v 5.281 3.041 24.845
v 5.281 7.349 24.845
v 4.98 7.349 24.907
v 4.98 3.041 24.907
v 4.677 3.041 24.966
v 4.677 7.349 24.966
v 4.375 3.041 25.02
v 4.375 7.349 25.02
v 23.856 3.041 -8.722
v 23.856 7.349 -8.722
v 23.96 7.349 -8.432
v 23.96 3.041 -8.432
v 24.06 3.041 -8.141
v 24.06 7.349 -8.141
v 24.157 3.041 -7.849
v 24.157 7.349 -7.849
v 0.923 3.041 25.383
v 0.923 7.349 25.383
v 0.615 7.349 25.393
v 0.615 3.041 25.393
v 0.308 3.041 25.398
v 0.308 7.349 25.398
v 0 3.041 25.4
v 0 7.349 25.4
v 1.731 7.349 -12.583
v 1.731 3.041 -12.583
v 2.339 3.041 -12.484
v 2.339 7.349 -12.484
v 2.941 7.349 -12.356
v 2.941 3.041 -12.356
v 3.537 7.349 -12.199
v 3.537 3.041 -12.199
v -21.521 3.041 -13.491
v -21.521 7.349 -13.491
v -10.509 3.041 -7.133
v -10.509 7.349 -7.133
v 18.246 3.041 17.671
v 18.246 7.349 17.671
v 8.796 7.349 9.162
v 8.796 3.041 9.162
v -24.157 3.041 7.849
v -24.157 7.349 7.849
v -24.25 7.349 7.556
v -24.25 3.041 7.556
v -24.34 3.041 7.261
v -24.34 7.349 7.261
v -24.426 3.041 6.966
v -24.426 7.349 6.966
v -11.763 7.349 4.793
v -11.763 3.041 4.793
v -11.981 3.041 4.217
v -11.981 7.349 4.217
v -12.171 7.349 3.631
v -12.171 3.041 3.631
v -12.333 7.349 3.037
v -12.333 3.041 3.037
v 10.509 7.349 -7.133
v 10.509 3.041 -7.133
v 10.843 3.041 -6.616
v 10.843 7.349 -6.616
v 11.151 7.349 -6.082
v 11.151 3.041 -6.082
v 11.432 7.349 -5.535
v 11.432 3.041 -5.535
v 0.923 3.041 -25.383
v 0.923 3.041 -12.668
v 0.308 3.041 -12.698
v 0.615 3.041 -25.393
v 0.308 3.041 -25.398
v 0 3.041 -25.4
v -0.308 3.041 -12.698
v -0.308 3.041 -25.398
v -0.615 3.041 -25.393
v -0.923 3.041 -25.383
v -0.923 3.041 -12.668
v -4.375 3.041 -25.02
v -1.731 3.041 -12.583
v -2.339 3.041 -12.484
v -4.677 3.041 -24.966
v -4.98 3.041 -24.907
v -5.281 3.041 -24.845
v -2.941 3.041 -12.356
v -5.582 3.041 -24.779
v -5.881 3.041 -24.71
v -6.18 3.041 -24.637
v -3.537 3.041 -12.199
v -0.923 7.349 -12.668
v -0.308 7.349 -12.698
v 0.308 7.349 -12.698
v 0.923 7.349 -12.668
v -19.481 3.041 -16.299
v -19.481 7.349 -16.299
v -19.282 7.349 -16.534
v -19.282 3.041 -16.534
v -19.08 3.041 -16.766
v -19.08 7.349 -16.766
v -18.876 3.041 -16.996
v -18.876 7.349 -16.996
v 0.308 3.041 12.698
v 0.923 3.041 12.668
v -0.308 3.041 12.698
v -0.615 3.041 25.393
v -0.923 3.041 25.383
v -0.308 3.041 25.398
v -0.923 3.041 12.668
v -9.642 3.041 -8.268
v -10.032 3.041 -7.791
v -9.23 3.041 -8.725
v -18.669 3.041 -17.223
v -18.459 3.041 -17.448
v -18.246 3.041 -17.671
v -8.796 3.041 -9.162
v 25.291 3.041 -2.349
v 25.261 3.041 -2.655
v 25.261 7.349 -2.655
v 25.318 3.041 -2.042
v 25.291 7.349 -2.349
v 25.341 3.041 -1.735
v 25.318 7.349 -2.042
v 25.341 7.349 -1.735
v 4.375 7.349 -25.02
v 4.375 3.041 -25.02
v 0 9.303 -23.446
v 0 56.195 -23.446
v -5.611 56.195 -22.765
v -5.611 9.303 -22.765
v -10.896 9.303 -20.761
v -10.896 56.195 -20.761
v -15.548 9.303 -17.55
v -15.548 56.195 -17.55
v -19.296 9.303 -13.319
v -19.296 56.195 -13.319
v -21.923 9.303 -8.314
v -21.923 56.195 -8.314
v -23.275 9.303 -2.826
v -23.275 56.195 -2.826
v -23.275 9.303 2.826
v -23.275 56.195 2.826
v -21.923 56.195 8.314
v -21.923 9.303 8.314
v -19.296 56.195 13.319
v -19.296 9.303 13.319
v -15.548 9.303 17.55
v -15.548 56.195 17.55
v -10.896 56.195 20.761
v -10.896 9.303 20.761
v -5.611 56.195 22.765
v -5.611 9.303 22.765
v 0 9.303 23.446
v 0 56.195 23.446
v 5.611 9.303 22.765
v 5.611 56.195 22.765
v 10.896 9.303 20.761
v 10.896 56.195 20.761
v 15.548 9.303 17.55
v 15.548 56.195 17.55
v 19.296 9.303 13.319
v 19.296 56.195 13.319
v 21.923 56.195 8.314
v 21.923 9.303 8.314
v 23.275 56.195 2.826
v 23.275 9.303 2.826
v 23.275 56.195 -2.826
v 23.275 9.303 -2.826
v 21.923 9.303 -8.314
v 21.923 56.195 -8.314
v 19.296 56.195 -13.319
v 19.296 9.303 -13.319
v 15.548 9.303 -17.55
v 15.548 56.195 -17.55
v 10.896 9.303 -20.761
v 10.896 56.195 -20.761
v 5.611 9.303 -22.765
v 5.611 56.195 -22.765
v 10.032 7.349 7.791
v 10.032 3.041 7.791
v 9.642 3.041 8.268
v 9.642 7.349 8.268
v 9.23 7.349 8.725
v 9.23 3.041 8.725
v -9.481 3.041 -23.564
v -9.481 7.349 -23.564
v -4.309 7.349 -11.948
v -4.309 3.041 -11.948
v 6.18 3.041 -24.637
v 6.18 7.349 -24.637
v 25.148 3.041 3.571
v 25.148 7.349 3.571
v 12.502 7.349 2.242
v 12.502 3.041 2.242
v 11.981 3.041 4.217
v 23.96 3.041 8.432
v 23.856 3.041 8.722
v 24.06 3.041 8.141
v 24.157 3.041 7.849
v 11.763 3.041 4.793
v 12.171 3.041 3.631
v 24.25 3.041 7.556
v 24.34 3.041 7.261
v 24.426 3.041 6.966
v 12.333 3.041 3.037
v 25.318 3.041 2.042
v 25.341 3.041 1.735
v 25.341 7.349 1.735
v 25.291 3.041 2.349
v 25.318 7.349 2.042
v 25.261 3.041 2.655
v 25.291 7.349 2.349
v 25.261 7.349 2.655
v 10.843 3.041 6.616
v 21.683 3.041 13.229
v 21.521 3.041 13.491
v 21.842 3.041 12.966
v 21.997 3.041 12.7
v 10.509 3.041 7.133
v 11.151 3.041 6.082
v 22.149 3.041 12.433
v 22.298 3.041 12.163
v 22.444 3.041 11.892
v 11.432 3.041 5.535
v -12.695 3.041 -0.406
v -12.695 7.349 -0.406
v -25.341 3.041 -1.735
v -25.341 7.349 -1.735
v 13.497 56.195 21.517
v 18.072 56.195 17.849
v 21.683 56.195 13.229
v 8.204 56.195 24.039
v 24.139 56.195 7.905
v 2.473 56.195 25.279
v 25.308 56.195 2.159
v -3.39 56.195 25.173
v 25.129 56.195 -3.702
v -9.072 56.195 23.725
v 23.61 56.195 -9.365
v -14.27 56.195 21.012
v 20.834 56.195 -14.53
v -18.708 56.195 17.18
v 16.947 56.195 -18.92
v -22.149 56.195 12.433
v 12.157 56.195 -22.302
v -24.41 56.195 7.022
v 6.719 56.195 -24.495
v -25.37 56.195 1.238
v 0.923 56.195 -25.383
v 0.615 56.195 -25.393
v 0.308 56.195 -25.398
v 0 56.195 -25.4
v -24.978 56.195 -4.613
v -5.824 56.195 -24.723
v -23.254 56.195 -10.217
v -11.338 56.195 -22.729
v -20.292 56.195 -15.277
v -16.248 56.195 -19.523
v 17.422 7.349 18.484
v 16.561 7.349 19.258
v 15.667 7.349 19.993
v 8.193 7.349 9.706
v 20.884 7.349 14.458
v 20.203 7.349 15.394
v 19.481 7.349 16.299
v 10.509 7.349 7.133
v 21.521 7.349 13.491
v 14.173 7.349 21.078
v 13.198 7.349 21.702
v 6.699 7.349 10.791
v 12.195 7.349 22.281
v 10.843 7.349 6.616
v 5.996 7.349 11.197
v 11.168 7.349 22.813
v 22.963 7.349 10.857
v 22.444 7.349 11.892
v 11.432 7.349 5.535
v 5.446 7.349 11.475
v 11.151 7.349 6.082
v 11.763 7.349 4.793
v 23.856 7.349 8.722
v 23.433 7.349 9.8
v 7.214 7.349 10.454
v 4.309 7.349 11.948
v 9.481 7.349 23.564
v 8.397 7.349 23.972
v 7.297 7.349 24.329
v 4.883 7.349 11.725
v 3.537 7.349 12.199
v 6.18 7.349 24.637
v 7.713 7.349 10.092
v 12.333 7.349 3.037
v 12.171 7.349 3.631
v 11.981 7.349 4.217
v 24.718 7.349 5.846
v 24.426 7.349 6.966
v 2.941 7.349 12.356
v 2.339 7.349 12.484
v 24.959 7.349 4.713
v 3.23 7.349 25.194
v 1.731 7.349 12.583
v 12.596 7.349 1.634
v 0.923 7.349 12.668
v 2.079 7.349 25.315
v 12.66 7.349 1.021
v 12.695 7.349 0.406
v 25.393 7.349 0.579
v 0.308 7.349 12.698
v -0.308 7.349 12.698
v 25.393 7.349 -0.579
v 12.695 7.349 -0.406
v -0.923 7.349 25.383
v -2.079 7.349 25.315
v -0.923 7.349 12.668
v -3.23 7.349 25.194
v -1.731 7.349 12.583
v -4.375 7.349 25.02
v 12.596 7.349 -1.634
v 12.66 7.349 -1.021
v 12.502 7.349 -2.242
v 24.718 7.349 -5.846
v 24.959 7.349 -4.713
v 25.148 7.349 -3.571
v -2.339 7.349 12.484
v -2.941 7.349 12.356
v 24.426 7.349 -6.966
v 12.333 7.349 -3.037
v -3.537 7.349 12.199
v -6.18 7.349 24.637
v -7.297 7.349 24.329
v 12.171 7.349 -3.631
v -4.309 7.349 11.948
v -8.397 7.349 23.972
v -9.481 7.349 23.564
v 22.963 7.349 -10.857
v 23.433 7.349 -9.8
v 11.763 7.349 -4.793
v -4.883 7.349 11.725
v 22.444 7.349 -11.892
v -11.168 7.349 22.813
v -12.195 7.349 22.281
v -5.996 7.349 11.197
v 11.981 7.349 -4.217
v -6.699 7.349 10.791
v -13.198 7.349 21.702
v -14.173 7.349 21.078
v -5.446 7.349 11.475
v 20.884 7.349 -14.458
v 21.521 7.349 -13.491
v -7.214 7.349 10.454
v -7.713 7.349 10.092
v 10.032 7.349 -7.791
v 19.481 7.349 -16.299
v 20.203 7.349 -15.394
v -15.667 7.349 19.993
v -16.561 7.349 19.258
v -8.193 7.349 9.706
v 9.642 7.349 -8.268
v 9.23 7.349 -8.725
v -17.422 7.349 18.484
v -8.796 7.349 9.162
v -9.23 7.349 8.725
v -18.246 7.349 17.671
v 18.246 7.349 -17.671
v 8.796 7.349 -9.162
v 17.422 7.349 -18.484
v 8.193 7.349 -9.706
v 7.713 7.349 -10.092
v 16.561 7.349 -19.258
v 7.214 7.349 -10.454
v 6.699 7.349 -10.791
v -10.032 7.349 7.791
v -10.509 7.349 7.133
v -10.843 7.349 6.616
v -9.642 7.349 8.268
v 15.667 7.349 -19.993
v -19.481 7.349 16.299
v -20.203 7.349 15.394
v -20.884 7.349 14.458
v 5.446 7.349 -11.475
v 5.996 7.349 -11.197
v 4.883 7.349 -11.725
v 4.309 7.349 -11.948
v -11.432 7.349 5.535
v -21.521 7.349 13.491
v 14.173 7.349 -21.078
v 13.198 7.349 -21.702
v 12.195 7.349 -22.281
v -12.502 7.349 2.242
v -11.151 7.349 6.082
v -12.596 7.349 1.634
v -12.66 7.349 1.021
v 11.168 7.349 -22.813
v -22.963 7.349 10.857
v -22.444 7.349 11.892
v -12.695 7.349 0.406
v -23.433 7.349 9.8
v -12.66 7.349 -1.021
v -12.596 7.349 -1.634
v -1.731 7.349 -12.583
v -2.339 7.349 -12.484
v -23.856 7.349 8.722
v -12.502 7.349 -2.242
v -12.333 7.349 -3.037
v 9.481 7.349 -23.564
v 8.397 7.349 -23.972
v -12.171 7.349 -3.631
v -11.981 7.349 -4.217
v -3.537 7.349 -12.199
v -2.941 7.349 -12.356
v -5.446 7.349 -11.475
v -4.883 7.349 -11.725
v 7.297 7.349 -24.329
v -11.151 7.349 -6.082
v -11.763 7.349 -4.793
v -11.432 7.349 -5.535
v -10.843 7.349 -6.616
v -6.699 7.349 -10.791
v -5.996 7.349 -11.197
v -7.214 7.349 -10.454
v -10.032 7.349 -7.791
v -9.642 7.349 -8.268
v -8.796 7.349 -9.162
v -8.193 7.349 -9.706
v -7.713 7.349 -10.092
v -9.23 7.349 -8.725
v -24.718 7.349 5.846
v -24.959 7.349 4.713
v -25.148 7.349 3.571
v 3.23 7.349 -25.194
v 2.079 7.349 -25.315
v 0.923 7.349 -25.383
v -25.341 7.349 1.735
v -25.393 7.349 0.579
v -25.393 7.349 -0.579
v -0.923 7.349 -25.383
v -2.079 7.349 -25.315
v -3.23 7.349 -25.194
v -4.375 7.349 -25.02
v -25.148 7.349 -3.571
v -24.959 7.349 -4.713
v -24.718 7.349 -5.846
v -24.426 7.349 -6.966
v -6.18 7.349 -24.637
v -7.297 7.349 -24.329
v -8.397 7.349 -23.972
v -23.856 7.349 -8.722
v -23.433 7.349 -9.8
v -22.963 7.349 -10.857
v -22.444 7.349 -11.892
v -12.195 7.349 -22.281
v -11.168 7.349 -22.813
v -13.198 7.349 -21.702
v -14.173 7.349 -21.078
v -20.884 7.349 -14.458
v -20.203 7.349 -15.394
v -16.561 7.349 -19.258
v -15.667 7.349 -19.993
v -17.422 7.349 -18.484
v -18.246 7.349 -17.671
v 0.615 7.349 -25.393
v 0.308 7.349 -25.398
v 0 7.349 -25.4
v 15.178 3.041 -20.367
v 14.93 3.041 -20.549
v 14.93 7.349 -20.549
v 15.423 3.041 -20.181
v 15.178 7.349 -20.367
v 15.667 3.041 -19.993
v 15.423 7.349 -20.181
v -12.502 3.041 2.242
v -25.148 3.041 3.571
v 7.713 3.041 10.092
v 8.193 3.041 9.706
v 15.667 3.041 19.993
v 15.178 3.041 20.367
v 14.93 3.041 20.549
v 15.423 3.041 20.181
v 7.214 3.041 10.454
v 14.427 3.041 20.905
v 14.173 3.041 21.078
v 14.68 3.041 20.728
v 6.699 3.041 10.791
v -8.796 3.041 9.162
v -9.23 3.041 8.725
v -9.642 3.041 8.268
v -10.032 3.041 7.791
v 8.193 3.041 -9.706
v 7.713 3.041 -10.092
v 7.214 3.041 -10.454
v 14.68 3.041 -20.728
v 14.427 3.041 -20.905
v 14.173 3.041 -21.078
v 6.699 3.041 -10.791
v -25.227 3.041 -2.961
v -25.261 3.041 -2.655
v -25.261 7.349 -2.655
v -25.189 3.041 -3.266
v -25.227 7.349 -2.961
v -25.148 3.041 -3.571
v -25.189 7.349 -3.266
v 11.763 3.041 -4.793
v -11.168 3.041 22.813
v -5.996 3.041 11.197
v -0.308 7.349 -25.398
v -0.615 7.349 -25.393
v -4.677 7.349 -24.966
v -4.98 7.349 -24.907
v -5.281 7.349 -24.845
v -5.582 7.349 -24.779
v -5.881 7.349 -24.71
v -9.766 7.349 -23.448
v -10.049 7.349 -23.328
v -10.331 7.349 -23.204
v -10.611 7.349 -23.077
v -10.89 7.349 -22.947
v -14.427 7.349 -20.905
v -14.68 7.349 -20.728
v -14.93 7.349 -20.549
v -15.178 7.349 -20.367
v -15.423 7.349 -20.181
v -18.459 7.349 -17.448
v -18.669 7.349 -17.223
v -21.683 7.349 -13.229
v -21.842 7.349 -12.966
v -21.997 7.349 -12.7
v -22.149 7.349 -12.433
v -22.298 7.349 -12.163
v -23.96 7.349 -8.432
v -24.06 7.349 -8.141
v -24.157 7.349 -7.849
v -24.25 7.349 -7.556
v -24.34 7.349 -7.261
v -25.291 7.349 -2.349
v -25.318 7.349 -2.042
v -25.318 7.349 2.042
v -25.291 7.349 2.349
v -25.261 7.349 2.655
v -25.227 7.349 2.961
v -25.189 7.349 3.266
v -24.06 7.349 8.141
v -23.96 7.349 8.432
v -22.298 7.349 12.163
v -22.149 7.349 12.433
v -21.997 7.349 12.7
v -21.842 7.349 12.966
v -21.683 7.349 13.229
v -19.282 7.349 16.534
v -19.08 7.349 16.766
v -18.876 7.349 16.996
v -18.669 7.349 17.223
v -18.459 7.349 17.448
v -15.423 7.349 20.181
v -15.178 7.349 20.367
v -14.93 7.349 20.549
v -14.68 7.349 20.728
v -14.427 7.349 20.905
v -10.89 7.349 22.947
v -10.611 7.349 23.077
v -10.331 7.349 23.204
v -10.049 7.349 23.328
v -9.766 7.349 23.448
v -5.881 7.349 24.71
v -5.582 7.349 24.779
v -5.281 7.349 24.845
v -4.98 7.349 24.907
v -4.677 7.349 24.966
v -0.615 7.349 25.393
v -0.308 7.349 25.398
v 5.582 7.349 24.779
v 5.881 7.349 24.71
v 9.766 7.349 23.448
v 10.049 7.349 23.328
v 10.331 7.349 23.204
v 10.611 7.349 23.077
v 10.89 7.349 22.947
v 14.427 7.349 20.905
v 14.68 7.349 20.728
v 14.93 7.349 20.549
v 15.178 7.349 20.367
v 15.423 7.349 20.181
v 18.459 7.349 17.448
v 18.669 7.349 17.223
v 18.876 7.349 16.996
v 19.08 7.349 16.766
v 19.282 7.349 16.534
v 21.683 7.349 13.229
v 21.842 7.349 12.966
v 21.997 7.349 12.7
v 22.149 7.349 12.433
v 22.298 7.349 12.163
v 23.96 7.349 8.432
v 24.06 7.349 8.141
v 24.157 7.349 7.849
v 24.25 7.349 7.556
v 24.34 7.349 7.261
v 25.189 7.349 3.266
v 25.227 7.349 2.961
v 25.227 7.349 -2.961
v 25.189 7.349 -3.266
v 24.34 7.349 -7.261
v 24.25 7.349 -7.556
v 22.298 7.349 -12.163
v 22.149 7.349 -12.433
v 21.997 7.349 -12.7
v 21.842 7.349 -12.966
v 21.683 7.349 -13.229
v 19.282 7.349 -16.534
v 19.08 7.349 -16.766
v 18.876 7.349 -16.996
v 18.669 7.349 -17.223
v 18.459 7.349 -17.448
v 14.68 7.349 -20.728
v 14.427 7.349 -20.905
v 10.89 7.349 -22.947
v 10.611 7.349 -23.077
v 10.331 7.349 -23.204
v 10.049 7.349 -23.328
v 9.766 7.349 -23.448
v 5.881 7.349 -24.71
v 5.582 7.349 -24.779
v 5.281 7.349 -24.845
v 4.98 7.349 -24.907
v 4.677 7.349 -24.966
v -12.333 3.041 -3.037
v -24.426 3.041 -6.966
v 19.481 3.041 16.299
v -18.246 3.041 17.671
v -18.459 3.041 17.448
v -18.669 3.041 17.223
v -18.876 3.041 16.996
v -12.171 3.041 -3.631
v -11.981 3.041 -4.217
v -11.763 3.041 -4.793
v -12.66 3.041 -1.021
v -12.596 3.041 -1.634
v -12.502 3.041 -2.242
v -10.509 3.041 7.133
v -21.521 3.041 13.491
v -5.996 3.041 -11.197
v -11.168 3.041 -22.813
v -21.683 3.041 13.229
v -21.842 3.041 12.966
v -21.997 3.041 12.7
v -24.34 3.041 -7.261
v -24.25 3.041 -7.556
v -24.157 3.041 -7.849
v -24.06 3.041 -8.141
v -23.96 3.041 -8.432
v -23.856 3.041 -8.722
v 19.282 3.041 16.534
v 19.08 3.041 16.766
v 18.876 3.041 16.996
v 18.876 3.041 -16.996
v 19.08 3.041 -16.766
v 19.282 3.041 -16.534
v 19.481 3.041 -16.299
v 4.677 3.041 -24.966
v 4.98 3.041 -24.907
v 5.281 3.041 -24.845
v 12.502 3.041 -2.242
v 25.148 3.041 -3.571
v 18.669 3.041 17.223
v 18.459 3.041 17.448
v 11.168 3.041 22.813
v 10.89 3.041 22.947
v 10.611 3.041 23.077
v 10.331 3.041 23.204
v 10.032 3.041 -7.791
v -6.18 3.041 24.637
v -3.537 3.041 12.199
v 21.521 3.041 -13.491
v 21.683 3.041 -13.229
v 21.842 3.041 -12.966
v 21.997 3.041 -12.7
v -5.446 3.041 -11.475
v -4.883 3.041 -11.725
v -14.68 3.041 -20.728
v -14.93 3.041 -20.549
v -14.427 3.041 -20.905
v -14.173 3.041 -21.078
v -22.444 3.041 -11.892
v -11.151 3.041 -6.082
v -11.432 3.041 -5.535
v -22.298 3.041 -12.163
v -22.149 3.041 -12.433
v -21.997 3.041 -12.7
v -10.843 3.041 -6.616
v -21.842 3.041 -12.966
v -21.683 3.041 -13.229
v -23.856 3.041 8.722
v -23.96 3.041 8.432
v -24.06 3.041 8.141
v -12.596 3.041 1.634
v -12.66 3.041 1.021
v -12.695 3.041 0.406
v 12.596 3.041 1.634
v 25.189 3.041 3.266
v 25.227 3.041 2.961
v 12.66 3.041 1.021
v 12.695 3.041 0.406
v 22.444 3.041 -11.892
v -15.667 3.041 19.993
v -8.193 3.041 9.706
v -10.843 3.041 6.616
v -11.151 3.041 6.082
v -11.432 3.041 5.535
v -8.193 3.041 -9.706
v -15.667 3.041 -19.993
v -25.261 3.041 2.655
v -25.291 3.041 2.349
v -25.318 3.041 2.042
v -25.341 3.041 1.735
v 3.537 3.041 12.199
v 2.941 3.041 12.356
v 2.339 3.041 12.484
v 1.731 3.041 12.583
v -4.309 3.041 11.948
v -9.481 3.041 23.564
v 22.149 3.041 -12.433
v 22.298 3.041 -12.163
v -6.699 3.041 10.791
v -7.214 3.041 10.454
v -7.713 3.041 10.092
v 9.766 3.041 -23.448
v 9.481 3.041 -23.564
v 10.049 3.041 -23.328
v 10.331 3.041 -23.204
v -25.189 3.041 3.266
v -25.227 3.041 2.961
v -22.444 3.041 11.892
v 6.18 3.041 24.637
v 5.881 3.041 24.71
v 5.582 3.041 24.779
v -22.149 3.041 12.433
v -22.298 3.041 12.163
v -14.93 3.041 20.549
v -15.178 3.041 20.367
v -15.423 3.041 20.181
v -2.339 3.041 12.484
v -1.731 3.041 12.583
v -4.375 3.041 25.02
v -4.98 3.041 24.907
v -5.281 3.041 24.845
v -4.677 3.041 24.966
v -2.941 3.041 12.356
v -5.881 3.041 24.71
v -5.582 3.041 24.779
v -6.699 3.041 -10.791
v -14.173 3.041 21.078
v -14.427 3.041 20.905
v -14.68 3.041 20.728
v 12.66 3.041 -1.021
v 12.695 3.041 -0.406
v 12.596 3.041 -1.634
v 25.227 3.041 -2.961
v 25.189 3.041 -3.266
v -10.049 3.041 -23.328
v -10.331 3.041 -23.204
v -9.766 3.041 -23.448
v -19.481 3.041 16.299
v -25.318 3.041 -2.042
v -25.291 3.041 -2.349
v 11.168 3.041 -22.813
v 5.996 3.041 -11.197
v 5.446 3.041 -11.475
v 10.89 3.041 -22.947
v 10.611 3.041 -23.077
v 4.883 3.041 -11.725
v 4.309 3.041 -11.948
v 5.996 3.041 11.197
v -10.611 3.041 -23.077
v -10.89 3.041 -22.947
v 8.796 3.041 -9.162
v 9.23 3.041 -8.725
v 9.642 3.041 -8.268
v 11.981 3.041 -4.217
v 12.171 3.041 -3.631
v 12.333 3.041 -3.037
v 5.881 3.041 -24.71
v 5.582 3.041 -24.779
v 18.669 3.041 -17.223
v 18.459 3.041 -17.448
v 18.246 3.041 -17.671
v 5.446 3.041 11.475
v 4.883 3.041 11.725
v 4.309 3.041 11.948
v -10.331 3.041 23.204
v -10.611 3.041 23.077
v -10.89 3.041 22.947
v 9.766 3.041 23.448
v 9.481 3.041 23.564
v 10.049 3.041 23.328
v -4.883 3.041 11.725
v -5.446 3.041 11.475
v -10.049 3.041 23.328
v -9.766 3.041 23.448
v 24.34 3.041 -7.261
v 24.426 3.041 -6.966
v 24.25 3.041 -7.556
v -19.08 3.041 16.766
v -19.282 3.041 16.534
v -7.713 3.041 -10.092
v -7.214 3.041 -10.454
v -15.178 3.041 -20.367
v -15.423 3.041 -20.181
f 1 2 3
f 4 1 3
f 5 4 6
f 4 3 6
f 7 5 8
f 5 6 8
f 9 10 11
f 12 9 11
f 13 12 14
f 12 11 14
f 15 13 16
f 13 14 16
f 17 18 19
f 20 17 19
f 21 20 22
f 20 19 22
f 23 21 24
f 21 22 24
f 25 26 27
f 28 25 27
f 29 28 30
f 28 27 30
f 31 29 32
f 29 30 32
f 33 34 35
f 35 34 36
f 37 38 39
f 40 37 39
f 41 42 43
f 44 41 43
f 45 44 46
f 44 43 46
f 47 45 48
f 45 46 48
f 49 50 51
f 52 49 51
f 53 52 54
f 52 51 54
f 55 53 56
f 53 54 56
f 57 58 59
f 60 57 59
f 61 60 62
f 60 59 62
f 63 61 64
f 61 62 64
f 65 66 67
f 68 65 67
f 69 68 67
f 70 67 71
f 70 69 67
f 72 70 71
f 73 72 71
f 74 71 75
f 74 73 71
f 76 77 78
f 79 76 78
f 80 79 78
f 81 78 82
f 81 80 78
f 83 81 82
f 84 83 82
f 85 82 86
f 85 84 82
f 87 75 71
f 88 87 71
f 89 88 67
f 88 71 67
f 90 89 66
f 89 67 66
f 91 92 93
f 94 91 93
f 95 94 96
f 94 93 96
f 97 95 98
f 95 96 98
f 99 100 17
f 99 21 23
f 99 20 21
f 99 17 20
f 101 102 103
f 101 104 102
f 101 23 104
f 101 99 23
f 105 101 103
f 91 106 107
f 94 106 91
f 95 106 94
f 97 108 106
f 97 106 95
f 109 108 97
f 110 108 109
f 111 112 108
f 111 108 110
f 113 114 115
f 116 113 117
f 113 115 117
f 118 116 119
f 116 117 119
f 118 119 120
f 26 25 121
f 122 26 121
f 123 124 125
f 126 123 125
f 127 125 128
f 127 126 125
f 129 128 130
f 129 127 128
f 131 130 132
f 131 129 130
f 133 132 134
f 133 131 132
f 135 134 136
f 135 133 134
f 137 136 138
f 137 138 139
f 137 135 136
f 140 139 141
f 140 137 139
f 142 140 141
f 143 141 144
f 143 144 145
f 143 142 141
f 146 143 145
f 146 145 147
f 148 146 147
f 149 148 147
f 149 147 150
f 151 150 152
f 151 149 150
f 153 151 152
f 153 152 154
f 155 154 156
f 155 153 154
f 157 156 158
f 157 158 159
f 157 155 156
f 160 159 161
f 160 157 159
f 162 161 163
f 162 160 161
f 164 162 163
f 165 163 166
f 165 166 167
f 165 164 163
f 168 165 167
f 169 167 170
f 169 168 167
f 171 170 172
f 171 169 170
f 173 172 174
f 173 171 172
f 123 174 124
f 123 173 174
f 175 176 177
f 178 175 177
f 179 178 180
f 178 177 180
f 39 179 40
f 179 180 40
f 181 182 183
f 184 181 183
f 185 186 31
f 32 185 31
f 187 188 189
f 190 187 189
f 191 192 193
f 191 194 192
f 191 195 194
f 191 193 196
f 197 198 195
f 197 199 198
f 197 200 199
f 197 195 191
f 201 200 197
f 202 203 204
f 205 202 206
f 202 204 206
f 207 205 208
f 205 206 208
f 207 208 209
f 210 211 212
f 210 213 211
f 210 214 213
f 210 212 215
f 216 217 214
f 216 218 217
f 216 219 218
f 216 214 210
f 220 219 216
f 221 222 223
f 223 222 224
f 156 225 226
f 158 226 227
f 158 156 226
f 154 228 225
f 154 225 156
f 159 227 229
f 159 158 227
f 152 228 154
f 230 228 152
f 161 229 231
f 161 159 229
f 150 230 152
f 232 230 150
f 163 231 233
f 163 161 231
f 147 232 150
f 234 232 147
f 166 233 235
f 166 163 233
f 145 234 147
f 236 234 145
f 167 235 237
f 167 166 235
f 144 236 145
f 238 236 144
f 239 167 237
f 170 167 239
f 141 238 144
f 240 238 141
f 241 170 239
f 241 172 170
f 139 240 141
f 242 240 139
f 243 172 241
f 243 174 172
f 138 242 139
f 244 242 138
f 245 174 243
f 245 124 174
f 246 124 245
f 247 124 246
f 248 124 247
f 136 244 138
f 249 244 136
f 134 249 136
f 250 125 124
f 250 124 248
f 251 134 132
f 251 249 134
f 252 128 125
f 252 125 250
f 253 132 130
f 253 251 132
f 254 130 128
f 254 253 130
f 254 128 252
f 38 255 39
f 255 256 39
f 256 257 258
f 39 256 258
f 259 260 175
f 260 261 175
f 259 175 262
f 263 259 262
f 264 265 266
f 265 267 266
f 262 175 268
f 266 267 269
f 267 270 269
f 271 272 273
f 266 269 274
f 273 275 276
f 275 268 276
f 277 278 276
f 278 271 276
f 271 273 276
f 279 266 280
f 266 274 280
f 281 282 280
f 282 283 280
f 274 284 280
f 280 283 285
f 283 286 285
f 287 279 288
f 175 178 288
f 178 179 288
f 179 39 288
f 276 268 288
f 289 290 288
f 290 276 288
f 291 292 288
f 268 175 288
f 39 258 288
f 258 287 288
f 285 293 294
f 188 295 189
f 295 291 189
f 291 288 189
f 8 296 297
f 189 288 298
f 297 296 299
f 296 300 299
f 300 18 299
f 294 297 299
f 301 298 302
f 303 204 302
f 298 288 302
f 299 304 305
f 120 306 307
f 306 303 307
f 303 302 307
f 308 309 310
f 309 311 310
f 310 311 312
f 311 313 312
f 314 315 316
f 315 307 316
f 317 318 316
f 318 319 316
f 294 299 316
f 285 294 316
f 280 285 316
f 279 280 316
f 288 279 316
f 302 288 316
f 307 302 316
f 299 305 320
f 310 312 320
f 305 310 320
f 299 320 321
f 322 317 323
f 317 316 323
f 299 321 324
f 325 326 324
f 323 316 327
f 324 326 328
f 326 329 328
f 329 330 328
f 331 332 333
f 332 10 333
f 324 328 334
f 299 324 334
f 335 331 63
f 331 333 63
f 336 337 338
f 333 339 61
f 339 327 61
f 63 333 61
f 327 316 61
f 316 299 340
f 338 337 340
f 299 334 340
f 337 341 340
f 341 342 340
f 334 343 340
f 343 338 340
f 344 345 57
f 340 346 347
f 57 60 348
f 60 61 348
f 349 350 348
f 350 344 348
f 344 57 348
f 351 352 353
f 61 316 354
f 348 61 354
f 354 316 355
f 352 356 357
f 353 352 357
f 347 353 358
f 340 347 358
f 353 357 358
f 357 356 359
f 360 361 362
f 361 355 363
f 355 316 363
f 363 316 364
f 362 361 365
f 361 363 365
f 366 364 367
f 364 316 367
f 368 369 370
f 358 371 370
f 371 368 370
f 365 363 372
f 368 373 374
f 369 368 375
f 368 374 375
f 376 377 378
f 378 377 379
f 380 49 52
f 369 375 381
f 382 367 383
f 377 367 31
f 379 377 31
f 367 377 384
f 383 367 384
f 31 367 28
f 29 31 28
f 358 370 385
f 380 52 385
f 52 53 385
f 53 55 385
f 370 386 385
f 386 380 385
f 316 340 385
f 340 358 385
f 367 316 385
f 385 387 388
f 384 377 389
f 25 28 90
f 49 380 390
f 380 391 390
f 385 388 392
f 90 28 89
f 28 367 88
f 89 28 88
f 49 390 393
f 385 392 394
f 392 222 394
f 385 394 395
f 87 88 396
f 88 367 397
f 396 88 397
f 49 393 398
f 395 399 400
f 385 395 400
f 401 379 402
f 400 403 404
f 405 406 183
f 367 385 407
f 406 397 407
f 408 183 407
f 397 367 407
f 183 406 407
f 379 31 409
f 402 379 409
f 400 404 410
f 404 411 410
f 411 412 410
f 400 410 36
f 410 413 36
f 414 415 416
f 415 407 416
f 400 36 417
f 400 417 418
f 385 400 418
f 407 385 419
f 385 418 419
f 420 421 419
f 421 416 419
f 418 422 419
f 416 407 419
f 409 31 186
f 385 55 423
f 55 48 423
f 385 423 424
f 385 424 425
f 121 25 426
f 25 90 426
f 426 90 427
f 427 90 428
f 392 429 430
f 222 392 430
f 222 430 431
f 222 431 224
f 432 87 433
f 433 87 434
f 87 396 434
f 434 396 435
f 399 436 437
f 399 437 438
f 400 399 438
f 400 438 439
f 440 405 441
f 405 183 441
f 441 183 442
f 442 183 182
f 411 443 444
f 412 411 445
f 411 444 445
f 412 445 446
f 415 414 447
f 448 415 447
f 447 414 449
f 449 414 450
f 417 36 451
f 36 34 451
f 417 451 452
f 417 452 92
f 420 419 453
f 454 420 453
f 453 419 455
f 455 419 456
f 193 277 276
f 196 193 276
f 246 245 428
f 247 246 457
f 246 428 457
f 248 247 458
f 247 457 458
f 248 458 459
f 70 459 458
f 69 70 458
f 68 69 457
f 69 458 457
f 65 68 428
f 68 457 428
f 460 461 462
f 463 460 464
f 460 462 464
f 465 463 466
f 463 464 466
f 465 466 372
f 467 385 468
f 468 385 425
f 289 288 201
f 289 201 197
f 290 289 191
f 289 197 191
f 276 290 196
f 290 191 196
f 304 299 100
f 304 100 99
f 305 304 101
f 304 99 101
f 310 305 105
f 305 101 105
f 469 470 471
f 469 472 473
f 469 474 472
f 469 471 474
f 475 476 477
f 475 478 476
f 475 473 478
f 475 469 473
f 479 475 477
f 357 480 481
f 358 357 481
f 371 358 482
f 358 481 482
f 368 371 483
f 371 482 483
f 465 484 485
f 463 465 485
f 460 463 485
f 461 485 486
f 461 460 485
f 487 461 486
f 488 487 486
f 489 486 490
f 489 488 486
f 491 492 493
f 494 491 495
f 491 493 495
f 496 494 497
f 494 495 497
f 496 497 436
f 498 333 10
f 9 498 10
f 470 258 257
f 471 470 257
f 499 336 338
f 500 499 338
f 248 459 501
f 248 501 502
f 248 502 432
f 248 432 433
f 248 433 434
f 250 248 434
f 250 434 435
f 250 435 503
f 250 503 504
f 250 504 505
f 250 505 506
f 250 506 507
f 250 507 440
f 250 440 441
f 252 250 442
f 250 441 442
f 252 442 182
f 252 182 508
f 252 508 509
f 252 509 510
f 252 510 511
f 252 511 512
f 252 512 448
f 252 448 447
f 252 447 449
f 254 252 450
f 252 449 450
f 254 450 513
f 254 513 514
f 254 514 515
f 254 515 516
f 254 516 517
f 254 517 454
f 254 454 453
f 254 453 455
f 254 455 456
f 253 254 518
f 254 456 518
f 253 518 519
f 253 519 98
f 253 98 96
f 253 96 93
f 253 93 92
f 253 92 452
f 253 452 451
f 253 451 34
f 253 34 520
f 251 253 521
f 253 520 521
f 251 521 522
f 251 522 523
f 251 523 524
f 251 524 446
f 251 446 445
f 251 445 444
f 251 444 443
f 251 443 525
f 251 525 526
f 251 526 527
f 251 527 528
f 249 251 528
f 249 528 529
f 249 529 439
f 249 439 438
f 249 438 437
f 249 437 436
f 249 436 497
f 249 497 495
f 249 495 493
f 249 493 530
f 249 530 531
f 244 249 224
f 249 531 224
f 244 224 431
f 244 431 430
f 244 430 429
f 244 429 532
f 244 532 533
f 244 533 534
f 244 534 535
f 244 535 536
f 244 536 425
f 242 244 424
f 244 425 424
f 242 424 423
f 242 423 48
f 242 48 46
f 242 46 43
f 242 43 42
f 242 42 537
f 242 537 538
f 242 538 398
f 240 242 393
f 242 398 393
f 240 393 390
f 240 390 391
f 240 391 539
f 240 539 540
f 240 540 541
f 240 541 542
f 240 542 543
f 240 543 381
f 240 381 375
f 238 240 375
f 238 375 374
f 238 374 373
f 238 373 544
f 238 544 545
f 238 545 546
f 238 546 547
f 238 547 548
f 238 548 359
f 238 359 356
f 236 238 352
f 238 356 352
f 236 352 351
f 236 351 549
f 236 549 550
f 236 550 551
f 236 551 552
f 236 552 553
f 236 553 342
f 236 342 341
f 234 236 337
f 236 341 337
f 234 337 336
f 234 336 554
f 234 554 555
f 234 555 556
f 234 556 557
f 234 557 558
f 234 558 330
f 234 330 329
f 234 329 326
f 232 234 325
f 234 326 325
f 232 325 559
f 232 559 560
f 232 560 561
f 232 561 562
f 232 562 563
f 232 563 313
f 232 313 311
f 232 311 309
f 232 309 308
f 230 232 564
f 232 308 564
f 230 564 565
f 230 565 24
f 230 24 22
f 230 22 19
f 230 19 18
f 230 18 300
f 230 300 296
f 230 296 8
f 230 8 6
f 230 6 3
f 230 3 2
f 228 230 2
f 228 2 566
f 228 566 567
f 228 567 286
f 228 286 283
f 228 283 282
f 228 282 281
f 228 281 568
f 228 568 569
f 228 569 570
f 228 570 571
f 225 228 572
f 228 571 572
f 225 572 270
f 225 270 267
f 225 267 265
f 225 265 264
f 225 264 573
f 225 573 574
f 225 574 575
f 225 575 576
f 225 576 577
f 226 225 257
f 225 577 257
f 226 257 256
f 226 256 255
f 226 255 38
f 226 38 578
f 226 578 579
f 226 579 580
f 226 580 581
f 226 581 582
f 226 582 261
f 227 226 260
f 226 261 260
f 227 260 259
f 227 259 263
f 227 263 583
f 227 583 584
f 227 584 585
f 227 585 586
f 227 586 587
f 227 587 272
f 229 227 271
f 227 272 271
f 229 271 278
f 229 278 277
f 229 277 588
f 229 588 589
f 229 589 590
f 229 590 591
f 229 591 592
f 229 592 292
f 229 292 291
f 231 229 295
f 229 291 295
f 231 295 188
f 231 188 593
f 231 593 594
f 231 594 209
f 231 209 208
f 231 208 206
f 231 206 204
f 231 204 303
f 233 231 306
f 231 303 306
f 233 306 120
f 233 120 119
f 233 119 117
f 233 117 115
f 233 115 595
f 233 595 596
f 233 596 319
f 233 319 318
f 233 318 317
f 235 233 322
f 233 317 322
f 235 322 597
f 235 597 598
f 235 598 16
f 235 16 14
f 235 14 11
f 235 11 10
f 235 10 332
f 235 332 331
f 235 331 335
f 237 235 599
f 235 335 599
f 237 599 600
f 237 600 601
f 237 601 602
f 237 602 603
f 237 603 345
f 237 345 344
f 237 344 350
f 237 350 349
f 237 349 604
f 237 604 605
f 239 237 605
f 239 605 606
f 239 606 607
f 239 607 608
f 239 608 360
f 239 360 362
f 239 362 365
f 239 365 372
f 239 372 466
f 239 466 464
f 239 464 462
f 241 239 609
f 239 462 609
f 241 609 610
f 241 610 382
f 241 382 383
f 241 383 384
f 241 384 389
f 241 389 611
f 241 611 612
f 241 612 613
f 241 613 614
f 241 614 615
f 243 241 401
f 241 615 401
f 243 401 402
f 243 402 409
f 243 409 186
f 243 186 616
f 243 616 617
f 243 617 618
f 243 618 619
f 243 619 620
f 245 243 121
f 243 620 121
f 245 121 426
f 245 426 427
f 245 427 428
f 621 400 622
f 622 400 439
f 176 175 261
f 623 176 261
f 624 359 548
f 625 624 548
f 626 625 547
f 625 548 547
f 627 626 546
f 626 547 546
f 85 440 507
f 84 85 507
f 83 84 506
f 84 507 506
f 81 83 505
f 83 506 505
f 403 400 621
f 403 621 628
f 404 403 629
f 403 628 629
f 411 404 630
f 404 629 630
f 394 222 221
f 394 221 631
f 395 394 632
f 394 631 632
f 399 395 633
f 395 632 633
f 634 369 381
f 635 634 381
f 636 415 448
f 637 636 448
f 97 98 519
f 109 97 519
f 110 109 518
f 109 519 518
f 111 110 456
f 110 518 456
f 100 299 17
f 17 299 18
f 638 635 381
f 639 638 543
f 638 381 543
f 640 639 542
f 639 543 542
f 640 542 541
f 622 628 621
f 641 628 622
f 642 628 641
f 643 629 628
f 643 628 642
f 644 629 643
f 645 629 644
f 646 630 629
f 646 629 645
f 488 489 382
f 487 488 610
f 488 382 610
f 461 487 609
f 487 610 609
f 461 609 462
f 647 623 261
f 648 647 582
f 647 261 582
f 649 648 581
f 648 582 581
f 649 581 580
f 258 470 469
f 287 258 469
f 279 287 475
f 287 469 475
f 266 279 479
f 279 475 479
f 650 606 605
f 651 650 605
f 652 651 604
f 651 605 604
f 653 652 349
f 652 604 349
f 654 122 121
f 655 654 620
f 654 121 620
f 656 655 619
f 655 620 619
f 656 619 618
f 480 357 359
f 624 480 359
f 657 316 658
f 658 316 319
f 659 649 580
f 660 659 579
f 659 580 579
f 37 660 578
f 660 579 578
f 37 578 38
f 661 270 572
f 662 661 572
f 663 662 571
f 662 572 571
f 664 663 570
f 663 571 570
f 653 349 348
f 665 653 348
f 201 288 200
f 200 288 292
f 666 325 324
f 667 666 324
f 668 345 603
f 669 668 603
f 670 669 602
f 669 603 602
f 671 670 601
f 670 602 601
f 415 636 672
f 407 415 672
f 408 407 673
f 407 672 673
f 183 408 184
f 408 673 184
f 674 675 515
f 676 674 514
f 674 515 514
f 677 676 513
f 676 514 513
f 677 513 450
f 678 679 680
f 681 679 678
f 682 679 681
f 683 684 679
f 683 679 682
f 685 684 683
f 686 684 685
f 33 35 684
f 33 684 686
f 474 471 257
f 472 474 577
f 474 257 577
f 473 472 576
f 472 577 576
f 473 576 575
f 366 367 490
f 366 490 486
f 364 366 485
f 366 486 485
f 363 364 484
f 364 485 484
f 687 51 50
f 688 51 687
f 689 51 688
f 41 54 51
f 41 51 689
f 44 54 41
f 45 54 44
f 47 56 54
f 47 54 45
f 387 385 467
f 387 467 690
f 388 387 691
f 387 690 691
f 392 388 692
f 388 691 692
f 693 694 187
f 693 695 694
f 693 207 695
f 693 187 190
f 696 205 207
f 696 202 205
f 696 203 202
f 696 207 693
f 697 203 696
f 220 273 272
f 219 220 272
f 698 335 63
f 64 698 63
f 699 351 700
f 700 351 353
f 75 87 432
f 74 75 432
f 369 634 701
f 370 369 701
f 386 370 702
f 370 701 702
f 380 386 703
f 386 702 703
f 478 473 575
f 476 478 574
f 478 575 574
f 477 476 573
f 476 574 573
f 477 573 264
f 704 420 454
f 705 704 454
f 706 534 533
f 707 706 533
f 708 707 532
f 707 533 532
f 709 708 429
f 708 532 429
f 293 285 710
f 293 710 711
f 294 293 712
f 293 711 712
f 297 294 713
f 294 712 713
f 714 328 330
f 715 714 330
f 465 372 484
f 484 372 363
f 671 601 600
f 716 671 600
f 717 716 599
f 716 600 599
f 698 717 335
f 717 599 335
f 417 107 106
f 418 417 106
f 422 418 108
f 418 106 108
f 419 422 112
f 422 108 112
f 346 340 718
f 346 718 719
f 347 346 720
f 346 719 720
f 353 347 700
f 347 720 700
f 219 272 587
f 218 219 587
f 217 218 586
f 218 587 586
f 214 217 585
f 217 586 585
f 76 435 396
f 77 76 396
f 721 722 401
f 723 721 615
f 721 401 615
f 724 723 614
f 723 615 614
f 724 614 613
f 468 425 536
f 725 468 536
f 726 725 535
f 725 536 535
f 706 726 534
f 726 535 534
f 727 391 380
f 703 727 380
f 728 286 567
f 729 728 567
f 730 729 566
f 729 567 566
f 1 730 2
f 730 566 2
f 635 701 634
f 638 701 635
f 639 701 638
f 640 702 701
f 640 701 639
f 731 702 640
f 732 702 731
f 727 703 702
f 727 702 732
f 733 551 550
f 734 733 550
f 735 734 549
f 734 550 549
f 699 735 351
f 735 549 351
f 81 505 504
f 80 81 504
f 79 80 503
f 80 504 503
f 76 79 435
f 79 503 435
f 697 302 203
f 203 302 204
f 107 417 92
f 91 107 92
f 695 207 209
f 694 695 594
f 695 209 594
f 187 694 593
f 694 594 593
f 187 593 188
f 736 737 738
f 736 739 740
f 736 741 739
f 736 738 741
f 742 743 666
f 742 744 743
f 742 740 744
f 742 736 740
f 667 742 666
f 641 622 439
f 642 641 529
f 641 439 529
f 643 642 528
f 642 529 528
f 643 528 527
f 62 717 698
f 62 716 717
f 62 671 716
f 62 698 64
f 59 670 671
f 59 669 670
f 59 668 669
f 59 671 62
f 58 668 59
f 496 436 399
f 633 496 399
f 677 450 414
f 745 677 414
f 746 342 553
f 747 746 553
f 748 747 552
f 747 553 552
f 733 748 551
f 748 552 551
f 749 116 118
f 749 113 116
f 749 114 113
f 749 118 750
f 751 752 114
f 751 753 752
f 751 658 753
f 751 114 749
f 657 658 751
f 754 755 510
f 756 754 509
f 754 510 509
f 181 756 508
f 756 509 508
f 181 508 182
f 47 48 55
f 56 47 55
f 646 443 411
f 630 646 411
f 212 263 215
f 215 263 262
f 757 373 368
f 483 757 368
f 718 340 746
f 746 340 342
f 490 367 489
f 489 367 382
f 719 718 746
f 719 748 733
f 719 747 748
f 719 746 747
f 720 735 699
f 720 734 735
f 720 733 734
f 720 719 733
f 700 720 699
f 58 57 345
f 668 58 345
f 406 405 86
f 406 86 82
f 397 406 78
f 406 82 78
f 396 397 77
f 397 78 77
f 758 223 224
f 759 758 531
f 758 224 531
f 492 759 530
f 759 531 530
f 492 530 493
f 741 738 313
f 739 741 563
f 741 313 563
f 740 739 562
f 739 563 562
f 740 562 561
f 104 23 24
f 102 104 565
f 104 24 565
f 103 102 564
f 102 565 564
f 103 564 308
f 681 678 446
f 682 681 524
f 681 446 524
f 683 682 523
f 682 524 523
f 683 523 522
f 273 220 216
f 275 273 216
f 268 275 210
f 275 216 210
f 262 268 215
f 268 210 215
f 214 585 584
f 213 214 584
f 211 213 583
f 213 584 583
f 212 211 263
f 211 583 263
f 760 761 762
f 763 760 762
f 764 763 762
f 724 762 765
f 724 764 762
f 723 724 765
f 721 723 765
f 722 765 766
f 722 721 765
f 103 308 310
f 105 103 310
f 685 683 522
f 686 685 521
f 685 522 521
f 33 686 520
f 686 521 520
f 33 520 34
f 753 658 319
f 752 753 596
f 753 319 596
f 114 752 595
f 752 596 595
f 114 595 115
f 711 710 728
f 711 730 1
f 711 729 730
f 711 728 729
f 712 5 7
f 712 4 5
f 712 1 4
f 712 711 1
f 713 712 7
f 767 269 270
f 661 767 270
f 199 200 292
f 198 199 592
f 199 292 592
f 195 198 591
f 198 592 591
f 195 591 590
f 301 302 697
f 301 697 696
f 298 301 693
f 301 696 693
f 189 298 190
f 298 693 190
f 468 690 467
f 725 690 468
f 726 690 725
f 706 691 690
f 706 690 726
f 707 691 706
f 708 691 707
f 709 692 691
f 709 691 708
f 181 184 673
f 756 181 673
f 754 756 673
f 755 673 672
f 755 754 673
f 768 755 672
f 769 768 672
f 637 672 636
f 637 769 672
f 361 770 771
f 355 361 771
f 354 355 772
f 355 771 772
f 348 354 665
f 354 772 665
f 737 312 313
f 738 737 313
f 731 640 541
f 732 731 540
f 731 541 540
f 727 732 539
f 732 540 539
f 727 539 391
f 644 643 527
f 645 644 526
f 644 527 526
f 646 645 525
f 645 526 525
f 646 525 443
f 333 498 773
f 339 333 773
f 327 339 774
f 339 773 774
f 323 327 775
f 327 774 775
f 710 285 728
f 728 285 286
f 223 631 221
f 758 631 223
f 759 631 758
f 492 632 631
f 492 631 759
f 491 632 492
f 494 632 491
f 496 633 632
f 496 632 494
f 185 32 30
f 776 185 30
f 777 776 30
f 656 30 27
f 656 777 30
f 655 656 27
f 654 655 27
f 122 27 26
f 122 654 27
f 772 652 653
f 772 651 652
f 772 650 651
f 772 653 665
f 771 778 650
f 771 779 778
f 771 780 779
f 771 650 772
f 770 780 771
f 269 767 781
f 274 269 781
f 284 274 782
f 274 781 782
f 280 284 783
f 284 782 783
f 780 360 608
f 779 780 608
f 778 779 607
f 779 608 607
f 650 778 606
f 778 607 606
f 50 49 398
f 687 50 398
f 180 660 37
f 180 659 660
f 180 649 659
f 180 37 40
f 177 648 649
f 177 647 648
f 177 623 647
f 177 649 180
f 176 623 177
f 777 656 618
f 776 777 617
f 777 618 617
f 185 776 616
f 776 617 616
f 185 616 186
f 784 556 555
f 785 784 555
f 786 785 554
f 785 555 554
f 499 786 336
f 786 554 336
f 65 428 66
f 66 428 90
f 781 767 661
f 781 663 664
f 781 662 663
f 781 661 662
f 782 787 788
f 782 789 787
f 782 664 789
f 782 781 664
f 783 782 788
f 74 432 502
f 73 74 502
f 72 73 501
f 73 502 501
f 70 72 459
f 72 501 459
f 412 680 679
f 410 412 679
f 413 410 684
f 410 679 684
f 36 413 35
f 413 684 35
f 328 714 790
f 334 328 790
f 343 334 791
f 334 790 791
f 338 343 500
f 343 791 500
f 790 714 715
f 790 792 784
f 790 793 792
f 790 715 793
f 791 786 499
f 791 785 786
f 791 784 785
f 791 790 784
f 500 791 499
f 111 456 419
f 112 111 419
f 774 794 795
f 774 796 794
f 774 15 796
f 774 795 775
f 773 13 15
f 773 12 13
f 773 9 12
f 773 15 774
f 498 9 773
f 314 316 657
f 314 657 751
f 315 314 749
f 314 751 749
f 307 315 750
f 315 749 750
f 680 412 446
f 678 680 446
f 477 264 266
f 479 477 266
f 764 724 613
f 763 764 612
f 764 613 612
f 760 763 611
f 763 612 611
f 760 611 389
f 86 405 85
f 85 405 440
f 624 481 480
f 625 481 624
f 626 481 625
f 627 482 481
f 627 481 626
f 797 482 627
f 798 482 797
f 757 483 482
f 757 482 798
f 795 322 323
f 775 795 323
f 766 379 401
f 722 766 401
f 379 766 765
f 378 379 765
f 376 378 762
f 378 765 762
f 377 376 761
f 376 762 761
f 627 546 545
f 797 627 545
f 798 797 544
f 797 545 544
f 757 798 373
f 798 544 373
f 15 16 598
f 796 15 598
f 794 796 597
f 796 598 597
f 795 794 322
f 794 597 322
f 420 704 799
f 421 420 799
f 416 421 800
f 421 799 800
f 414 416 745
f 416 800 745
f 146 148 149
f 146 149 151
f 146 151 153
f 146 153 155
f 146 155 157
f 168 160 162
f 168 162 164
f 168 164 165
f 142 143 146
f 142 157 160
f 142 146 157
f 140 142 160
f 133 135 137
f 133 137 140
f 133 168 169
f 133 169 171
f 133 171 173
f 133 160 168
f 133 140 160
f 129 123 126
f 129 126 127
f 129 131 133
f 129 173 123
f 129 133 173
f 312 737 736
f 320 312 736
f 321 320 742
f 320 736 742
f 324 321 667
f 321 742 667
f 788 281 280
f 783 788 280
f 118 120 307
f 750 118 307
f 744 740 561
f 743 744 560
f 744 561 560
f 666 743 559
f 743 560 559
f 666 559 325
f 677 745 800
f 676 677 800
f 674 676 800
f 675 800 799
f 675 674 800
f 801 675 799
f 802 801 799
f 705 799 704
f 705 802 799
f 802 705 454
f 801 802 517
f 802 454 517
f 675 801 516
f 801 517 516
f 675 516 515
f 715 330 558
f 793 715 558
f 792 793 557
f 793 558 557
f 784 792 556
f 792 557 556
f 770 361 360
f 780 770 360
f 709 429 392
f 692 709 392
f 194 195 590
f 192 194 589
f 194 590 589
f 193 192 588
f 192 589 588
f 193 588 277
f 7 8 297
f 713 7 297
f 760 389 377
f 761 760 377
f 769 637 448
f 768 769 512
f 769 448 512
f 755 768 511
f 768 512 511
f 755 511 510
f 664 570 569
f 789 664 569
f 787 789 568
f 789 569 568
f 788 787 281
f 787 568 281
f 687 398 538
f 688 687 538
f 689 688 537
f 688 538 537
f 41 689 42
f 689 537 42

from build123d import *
from build123d.topology import SkipClean

# Parameters (mm, degrees)
SKETCH1_R               = 38.1
BOSS_EXTRUDE1_DEPTH     = 76.2
SHELL2_T                = 3.175
BOSS_EXTRUDE2_DEPTH     = 7
CUT_EXTRUDE1_DEPTH      = 99.527366122
CUT_EXTRUDE1_DEPTH_BACK = 99.527366122
SKETCH3_R               = 61.906276858
SKETCH3_R_2             = 41.275
SKETCH4_R               = 20.64
CUT_EXTRUDE2_DEPTH      = 7
SCALE1_SCALE            = 0.615384615


# Read off the part's stored shape, not the designer's step: Boss-Extrude2
with BuildPart() as part:
    # Sketch1 → Boss-Extrude1 (new body)
    with BuildSketch(Plane(origin=(0, 0, 0), x_dir=(1, 0, 0), z_dir=(0, 1, 0))):
        with Locations(Location((0, 0, 0), (0, 0, 90))):
            Circle(SKETCH1_R)
    extrude(amount=BOSS_EXTRUDE1_DEPTH)

    # Shell2
    shell2_openings = [part.faces().sort_by_distance(p)[0] for p in [
        (0, 76.2, 0),
    ]]
    offset(amount=SHELL2_T, openings=shell2_openings, kind=Kind.INTERSECTION)

    # Boss-Extrude2 outline → Boss-Extrude2 (add)
    with BuildSketch(Plane(origin=(0, -3.175, 0), x_dir=(-1, 0, 0), z_dir=(0, -1, 0))):
        Polygon((1.5, 14.271546681), (1.5, 41.275), (-1.5, 41.275), (-1.5, 14.271546681), (-7.114333637, 40.684909757), (-10.04877644, 40.061174684), (-4.434442802, 13.647811609), (-15.417736756, 38.316693729), (-18.158373129, 37.0964838), (-7.175079175, 12.42760168), (-23.047310797, 34.273854321), (-25.47436178, 32.510498564), (-9.602130158, 10.664245923), (-29.669606762, 28.733083016), (-31.676998581, 26.503648539), (-11.609521977, 8.434811446), (-34.995198541, 21.936538106), (-36.495198541, 19.338461894), (-13.109521977, 5.836735235), (-38.791332219, 14.181261217), (-39.718383202, 11.328091668), (-14.03657296, 2.983565686), (-40.892098536, 5.806195164), (-41.205683926, 2.822629478), (-14.35015835, 0), (-41.205683926, -2.822629478), (-40.892098536, -5.806195164), (-14.03657296, -2.983565686), (-39.718383202, -11.328091668), (-38.791332219, -14.181261217), (-13.109521977, -5.836735235), (-36.495198541, -19.338461894), (-34.995198541, -21.936538106), (-11.609521977, -8.434811446), (-31.676998581, -26.503648539), (-29.669606762, -28.733083016), (-9.602130158, -10.664245923), (-25.47436178, -32.510498564), (-23.047310797, -34.273854321), (-7.175079175, -12.42760168), (-18.158373129, -37.0964838), (-15.417736756, -38.316693729), (-4.434442802, -13.647811609), (-10.04877644, -40.061174684), (-7.114333637, -40.684909757), (-1.5, -14.271546681), (-1.5, -41.275), (1.5, -41.275), (1.5, -14.271546681), (7.114333637, -40.684909757), (10.04877644, -40.061174684), (4.434442802, -13.647811609), (15.417736756, -38.316693729), (18.158373129, -37.0964838), (7.175079175, -12.42760168), (23.047310797, -34.273854321), (25.47436178, -32.510498564), (9.602130158, -10.664245923), (29.669606762, -28.733083016), (31.676998581, -26.503648539), (11.609521977, -8.434811446), (34.995198541, -21.936538106), (36.495198541, -19.338461894), (13.109521977, -5.836735235), (38.791332219, -14.181261217), (39.718383202, -11.328091668), (14.03657296, -2.983565686), (40.892098536, -5.806195164), (41.205683926, -2.822629478), (14.35015835, 0), (41.205683926, 2.822629478), (40.892098536, 5.806195164), (14.03657296, 2.983565686), (39.718383202, 11.328091668), (38.791332219, 14.181261217), (13.109521977, 5.836735235), (36.495198541, 19.338461894), (34.995198541, 21.936538106), (11.609521977, 8.434811446), (31.676998581, 26.503648539), (29.669606762, 28.733083016), (9.602130158, 10.664245923), (25.47436178, 32.510498564), (23.047310797, 34.273854321), (7.175079175, 12.42760168), (18.158373129, 37.0964838), (15.417736756, 38.316693729), (4.434442802, 13.647811609), (10.04877644, 40.061174684), (7.114333637, 40.684909757), align=None)
    extrude(amount=BOSS_EXTRUDE2_DEPTH)

    # Sketch3 → Cut-Extrude1 (cut, two sides: drawn at the far end of the back side and taken through both)
    with SkipClean():  # the faces are left unmerged after this step: merging them gives an invalid solid
        with BuildSketch(Plane.XZ.offset(3.175).offset(-CUT_EXTRUDE1_DEPTH_BACK)):
            Circle(SKETCH3_R)
            with Locations(Location((0, 0, 0), (0, 0, 272.082679548))):
                Circle(SKETCH3_R_2, mode=Mode.SUBTRACT)
        extrude(amount=CUT_EXTRUDE1_DEPTH + CUT_EXTRUDE1_DEPTH_BACK, mode=Mode.SUBTRACT)

    # Sketch4 → Cut-Extrude2 (cut)
    with SkipClean():  # the faces are left unmerged after this step: merging them gives an invalid solid
        with BuildSketch(Plane.XZ.offset(10.175)):
            Circle(SKETCH4_R)
        extrude(amount=-CUT_EXTRUDE2_DEPTH, mode=Mode.SUBTRACT)


with BuildPart() as part_1:
    # Scale1: scaled about (0, 24.187012891, 0)
    add(part.part.scale(SCALE1_SCALE).moved(Location((0, 9.302697266, 0))))


solid = part_1.part
